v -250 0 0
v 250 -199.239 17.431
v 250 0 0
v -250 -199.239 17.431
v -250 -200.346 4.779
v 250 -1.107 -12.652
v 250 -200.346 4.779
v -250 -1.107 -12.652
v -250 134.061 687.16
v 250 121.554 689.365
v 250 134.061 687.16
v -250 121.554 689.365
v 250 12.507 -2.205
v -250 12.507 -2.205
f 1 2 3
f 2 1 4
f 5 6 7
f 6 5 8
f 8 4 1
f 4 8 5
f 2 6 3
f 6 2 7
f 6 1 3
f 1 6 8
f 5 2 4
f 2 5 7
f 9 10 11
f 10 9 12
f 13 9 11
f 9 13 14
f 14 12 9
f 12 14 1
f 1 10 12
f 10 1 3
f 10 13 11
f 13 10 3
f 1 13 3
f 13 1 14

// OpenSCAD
seat_x=500;
seat_y=200;
seat_z=100;
seat_angle=5;

back_x=seat_x;
back_y=700;
back_angle=seat_angle+5;

in=25.4;
wood=in/2;

module wood(height=wood) {
    linear_extrude(height=height)
    children();
}

rotate([-seat_angle,0])
translate([-seat_x/2,-seat_y,-wood])
wood()
square([seat_x,seat_y]);

rotate([90-back_angle,0])
translate([-back_x/2,0,-wood])
wood()
square([back_x,back_y]);
